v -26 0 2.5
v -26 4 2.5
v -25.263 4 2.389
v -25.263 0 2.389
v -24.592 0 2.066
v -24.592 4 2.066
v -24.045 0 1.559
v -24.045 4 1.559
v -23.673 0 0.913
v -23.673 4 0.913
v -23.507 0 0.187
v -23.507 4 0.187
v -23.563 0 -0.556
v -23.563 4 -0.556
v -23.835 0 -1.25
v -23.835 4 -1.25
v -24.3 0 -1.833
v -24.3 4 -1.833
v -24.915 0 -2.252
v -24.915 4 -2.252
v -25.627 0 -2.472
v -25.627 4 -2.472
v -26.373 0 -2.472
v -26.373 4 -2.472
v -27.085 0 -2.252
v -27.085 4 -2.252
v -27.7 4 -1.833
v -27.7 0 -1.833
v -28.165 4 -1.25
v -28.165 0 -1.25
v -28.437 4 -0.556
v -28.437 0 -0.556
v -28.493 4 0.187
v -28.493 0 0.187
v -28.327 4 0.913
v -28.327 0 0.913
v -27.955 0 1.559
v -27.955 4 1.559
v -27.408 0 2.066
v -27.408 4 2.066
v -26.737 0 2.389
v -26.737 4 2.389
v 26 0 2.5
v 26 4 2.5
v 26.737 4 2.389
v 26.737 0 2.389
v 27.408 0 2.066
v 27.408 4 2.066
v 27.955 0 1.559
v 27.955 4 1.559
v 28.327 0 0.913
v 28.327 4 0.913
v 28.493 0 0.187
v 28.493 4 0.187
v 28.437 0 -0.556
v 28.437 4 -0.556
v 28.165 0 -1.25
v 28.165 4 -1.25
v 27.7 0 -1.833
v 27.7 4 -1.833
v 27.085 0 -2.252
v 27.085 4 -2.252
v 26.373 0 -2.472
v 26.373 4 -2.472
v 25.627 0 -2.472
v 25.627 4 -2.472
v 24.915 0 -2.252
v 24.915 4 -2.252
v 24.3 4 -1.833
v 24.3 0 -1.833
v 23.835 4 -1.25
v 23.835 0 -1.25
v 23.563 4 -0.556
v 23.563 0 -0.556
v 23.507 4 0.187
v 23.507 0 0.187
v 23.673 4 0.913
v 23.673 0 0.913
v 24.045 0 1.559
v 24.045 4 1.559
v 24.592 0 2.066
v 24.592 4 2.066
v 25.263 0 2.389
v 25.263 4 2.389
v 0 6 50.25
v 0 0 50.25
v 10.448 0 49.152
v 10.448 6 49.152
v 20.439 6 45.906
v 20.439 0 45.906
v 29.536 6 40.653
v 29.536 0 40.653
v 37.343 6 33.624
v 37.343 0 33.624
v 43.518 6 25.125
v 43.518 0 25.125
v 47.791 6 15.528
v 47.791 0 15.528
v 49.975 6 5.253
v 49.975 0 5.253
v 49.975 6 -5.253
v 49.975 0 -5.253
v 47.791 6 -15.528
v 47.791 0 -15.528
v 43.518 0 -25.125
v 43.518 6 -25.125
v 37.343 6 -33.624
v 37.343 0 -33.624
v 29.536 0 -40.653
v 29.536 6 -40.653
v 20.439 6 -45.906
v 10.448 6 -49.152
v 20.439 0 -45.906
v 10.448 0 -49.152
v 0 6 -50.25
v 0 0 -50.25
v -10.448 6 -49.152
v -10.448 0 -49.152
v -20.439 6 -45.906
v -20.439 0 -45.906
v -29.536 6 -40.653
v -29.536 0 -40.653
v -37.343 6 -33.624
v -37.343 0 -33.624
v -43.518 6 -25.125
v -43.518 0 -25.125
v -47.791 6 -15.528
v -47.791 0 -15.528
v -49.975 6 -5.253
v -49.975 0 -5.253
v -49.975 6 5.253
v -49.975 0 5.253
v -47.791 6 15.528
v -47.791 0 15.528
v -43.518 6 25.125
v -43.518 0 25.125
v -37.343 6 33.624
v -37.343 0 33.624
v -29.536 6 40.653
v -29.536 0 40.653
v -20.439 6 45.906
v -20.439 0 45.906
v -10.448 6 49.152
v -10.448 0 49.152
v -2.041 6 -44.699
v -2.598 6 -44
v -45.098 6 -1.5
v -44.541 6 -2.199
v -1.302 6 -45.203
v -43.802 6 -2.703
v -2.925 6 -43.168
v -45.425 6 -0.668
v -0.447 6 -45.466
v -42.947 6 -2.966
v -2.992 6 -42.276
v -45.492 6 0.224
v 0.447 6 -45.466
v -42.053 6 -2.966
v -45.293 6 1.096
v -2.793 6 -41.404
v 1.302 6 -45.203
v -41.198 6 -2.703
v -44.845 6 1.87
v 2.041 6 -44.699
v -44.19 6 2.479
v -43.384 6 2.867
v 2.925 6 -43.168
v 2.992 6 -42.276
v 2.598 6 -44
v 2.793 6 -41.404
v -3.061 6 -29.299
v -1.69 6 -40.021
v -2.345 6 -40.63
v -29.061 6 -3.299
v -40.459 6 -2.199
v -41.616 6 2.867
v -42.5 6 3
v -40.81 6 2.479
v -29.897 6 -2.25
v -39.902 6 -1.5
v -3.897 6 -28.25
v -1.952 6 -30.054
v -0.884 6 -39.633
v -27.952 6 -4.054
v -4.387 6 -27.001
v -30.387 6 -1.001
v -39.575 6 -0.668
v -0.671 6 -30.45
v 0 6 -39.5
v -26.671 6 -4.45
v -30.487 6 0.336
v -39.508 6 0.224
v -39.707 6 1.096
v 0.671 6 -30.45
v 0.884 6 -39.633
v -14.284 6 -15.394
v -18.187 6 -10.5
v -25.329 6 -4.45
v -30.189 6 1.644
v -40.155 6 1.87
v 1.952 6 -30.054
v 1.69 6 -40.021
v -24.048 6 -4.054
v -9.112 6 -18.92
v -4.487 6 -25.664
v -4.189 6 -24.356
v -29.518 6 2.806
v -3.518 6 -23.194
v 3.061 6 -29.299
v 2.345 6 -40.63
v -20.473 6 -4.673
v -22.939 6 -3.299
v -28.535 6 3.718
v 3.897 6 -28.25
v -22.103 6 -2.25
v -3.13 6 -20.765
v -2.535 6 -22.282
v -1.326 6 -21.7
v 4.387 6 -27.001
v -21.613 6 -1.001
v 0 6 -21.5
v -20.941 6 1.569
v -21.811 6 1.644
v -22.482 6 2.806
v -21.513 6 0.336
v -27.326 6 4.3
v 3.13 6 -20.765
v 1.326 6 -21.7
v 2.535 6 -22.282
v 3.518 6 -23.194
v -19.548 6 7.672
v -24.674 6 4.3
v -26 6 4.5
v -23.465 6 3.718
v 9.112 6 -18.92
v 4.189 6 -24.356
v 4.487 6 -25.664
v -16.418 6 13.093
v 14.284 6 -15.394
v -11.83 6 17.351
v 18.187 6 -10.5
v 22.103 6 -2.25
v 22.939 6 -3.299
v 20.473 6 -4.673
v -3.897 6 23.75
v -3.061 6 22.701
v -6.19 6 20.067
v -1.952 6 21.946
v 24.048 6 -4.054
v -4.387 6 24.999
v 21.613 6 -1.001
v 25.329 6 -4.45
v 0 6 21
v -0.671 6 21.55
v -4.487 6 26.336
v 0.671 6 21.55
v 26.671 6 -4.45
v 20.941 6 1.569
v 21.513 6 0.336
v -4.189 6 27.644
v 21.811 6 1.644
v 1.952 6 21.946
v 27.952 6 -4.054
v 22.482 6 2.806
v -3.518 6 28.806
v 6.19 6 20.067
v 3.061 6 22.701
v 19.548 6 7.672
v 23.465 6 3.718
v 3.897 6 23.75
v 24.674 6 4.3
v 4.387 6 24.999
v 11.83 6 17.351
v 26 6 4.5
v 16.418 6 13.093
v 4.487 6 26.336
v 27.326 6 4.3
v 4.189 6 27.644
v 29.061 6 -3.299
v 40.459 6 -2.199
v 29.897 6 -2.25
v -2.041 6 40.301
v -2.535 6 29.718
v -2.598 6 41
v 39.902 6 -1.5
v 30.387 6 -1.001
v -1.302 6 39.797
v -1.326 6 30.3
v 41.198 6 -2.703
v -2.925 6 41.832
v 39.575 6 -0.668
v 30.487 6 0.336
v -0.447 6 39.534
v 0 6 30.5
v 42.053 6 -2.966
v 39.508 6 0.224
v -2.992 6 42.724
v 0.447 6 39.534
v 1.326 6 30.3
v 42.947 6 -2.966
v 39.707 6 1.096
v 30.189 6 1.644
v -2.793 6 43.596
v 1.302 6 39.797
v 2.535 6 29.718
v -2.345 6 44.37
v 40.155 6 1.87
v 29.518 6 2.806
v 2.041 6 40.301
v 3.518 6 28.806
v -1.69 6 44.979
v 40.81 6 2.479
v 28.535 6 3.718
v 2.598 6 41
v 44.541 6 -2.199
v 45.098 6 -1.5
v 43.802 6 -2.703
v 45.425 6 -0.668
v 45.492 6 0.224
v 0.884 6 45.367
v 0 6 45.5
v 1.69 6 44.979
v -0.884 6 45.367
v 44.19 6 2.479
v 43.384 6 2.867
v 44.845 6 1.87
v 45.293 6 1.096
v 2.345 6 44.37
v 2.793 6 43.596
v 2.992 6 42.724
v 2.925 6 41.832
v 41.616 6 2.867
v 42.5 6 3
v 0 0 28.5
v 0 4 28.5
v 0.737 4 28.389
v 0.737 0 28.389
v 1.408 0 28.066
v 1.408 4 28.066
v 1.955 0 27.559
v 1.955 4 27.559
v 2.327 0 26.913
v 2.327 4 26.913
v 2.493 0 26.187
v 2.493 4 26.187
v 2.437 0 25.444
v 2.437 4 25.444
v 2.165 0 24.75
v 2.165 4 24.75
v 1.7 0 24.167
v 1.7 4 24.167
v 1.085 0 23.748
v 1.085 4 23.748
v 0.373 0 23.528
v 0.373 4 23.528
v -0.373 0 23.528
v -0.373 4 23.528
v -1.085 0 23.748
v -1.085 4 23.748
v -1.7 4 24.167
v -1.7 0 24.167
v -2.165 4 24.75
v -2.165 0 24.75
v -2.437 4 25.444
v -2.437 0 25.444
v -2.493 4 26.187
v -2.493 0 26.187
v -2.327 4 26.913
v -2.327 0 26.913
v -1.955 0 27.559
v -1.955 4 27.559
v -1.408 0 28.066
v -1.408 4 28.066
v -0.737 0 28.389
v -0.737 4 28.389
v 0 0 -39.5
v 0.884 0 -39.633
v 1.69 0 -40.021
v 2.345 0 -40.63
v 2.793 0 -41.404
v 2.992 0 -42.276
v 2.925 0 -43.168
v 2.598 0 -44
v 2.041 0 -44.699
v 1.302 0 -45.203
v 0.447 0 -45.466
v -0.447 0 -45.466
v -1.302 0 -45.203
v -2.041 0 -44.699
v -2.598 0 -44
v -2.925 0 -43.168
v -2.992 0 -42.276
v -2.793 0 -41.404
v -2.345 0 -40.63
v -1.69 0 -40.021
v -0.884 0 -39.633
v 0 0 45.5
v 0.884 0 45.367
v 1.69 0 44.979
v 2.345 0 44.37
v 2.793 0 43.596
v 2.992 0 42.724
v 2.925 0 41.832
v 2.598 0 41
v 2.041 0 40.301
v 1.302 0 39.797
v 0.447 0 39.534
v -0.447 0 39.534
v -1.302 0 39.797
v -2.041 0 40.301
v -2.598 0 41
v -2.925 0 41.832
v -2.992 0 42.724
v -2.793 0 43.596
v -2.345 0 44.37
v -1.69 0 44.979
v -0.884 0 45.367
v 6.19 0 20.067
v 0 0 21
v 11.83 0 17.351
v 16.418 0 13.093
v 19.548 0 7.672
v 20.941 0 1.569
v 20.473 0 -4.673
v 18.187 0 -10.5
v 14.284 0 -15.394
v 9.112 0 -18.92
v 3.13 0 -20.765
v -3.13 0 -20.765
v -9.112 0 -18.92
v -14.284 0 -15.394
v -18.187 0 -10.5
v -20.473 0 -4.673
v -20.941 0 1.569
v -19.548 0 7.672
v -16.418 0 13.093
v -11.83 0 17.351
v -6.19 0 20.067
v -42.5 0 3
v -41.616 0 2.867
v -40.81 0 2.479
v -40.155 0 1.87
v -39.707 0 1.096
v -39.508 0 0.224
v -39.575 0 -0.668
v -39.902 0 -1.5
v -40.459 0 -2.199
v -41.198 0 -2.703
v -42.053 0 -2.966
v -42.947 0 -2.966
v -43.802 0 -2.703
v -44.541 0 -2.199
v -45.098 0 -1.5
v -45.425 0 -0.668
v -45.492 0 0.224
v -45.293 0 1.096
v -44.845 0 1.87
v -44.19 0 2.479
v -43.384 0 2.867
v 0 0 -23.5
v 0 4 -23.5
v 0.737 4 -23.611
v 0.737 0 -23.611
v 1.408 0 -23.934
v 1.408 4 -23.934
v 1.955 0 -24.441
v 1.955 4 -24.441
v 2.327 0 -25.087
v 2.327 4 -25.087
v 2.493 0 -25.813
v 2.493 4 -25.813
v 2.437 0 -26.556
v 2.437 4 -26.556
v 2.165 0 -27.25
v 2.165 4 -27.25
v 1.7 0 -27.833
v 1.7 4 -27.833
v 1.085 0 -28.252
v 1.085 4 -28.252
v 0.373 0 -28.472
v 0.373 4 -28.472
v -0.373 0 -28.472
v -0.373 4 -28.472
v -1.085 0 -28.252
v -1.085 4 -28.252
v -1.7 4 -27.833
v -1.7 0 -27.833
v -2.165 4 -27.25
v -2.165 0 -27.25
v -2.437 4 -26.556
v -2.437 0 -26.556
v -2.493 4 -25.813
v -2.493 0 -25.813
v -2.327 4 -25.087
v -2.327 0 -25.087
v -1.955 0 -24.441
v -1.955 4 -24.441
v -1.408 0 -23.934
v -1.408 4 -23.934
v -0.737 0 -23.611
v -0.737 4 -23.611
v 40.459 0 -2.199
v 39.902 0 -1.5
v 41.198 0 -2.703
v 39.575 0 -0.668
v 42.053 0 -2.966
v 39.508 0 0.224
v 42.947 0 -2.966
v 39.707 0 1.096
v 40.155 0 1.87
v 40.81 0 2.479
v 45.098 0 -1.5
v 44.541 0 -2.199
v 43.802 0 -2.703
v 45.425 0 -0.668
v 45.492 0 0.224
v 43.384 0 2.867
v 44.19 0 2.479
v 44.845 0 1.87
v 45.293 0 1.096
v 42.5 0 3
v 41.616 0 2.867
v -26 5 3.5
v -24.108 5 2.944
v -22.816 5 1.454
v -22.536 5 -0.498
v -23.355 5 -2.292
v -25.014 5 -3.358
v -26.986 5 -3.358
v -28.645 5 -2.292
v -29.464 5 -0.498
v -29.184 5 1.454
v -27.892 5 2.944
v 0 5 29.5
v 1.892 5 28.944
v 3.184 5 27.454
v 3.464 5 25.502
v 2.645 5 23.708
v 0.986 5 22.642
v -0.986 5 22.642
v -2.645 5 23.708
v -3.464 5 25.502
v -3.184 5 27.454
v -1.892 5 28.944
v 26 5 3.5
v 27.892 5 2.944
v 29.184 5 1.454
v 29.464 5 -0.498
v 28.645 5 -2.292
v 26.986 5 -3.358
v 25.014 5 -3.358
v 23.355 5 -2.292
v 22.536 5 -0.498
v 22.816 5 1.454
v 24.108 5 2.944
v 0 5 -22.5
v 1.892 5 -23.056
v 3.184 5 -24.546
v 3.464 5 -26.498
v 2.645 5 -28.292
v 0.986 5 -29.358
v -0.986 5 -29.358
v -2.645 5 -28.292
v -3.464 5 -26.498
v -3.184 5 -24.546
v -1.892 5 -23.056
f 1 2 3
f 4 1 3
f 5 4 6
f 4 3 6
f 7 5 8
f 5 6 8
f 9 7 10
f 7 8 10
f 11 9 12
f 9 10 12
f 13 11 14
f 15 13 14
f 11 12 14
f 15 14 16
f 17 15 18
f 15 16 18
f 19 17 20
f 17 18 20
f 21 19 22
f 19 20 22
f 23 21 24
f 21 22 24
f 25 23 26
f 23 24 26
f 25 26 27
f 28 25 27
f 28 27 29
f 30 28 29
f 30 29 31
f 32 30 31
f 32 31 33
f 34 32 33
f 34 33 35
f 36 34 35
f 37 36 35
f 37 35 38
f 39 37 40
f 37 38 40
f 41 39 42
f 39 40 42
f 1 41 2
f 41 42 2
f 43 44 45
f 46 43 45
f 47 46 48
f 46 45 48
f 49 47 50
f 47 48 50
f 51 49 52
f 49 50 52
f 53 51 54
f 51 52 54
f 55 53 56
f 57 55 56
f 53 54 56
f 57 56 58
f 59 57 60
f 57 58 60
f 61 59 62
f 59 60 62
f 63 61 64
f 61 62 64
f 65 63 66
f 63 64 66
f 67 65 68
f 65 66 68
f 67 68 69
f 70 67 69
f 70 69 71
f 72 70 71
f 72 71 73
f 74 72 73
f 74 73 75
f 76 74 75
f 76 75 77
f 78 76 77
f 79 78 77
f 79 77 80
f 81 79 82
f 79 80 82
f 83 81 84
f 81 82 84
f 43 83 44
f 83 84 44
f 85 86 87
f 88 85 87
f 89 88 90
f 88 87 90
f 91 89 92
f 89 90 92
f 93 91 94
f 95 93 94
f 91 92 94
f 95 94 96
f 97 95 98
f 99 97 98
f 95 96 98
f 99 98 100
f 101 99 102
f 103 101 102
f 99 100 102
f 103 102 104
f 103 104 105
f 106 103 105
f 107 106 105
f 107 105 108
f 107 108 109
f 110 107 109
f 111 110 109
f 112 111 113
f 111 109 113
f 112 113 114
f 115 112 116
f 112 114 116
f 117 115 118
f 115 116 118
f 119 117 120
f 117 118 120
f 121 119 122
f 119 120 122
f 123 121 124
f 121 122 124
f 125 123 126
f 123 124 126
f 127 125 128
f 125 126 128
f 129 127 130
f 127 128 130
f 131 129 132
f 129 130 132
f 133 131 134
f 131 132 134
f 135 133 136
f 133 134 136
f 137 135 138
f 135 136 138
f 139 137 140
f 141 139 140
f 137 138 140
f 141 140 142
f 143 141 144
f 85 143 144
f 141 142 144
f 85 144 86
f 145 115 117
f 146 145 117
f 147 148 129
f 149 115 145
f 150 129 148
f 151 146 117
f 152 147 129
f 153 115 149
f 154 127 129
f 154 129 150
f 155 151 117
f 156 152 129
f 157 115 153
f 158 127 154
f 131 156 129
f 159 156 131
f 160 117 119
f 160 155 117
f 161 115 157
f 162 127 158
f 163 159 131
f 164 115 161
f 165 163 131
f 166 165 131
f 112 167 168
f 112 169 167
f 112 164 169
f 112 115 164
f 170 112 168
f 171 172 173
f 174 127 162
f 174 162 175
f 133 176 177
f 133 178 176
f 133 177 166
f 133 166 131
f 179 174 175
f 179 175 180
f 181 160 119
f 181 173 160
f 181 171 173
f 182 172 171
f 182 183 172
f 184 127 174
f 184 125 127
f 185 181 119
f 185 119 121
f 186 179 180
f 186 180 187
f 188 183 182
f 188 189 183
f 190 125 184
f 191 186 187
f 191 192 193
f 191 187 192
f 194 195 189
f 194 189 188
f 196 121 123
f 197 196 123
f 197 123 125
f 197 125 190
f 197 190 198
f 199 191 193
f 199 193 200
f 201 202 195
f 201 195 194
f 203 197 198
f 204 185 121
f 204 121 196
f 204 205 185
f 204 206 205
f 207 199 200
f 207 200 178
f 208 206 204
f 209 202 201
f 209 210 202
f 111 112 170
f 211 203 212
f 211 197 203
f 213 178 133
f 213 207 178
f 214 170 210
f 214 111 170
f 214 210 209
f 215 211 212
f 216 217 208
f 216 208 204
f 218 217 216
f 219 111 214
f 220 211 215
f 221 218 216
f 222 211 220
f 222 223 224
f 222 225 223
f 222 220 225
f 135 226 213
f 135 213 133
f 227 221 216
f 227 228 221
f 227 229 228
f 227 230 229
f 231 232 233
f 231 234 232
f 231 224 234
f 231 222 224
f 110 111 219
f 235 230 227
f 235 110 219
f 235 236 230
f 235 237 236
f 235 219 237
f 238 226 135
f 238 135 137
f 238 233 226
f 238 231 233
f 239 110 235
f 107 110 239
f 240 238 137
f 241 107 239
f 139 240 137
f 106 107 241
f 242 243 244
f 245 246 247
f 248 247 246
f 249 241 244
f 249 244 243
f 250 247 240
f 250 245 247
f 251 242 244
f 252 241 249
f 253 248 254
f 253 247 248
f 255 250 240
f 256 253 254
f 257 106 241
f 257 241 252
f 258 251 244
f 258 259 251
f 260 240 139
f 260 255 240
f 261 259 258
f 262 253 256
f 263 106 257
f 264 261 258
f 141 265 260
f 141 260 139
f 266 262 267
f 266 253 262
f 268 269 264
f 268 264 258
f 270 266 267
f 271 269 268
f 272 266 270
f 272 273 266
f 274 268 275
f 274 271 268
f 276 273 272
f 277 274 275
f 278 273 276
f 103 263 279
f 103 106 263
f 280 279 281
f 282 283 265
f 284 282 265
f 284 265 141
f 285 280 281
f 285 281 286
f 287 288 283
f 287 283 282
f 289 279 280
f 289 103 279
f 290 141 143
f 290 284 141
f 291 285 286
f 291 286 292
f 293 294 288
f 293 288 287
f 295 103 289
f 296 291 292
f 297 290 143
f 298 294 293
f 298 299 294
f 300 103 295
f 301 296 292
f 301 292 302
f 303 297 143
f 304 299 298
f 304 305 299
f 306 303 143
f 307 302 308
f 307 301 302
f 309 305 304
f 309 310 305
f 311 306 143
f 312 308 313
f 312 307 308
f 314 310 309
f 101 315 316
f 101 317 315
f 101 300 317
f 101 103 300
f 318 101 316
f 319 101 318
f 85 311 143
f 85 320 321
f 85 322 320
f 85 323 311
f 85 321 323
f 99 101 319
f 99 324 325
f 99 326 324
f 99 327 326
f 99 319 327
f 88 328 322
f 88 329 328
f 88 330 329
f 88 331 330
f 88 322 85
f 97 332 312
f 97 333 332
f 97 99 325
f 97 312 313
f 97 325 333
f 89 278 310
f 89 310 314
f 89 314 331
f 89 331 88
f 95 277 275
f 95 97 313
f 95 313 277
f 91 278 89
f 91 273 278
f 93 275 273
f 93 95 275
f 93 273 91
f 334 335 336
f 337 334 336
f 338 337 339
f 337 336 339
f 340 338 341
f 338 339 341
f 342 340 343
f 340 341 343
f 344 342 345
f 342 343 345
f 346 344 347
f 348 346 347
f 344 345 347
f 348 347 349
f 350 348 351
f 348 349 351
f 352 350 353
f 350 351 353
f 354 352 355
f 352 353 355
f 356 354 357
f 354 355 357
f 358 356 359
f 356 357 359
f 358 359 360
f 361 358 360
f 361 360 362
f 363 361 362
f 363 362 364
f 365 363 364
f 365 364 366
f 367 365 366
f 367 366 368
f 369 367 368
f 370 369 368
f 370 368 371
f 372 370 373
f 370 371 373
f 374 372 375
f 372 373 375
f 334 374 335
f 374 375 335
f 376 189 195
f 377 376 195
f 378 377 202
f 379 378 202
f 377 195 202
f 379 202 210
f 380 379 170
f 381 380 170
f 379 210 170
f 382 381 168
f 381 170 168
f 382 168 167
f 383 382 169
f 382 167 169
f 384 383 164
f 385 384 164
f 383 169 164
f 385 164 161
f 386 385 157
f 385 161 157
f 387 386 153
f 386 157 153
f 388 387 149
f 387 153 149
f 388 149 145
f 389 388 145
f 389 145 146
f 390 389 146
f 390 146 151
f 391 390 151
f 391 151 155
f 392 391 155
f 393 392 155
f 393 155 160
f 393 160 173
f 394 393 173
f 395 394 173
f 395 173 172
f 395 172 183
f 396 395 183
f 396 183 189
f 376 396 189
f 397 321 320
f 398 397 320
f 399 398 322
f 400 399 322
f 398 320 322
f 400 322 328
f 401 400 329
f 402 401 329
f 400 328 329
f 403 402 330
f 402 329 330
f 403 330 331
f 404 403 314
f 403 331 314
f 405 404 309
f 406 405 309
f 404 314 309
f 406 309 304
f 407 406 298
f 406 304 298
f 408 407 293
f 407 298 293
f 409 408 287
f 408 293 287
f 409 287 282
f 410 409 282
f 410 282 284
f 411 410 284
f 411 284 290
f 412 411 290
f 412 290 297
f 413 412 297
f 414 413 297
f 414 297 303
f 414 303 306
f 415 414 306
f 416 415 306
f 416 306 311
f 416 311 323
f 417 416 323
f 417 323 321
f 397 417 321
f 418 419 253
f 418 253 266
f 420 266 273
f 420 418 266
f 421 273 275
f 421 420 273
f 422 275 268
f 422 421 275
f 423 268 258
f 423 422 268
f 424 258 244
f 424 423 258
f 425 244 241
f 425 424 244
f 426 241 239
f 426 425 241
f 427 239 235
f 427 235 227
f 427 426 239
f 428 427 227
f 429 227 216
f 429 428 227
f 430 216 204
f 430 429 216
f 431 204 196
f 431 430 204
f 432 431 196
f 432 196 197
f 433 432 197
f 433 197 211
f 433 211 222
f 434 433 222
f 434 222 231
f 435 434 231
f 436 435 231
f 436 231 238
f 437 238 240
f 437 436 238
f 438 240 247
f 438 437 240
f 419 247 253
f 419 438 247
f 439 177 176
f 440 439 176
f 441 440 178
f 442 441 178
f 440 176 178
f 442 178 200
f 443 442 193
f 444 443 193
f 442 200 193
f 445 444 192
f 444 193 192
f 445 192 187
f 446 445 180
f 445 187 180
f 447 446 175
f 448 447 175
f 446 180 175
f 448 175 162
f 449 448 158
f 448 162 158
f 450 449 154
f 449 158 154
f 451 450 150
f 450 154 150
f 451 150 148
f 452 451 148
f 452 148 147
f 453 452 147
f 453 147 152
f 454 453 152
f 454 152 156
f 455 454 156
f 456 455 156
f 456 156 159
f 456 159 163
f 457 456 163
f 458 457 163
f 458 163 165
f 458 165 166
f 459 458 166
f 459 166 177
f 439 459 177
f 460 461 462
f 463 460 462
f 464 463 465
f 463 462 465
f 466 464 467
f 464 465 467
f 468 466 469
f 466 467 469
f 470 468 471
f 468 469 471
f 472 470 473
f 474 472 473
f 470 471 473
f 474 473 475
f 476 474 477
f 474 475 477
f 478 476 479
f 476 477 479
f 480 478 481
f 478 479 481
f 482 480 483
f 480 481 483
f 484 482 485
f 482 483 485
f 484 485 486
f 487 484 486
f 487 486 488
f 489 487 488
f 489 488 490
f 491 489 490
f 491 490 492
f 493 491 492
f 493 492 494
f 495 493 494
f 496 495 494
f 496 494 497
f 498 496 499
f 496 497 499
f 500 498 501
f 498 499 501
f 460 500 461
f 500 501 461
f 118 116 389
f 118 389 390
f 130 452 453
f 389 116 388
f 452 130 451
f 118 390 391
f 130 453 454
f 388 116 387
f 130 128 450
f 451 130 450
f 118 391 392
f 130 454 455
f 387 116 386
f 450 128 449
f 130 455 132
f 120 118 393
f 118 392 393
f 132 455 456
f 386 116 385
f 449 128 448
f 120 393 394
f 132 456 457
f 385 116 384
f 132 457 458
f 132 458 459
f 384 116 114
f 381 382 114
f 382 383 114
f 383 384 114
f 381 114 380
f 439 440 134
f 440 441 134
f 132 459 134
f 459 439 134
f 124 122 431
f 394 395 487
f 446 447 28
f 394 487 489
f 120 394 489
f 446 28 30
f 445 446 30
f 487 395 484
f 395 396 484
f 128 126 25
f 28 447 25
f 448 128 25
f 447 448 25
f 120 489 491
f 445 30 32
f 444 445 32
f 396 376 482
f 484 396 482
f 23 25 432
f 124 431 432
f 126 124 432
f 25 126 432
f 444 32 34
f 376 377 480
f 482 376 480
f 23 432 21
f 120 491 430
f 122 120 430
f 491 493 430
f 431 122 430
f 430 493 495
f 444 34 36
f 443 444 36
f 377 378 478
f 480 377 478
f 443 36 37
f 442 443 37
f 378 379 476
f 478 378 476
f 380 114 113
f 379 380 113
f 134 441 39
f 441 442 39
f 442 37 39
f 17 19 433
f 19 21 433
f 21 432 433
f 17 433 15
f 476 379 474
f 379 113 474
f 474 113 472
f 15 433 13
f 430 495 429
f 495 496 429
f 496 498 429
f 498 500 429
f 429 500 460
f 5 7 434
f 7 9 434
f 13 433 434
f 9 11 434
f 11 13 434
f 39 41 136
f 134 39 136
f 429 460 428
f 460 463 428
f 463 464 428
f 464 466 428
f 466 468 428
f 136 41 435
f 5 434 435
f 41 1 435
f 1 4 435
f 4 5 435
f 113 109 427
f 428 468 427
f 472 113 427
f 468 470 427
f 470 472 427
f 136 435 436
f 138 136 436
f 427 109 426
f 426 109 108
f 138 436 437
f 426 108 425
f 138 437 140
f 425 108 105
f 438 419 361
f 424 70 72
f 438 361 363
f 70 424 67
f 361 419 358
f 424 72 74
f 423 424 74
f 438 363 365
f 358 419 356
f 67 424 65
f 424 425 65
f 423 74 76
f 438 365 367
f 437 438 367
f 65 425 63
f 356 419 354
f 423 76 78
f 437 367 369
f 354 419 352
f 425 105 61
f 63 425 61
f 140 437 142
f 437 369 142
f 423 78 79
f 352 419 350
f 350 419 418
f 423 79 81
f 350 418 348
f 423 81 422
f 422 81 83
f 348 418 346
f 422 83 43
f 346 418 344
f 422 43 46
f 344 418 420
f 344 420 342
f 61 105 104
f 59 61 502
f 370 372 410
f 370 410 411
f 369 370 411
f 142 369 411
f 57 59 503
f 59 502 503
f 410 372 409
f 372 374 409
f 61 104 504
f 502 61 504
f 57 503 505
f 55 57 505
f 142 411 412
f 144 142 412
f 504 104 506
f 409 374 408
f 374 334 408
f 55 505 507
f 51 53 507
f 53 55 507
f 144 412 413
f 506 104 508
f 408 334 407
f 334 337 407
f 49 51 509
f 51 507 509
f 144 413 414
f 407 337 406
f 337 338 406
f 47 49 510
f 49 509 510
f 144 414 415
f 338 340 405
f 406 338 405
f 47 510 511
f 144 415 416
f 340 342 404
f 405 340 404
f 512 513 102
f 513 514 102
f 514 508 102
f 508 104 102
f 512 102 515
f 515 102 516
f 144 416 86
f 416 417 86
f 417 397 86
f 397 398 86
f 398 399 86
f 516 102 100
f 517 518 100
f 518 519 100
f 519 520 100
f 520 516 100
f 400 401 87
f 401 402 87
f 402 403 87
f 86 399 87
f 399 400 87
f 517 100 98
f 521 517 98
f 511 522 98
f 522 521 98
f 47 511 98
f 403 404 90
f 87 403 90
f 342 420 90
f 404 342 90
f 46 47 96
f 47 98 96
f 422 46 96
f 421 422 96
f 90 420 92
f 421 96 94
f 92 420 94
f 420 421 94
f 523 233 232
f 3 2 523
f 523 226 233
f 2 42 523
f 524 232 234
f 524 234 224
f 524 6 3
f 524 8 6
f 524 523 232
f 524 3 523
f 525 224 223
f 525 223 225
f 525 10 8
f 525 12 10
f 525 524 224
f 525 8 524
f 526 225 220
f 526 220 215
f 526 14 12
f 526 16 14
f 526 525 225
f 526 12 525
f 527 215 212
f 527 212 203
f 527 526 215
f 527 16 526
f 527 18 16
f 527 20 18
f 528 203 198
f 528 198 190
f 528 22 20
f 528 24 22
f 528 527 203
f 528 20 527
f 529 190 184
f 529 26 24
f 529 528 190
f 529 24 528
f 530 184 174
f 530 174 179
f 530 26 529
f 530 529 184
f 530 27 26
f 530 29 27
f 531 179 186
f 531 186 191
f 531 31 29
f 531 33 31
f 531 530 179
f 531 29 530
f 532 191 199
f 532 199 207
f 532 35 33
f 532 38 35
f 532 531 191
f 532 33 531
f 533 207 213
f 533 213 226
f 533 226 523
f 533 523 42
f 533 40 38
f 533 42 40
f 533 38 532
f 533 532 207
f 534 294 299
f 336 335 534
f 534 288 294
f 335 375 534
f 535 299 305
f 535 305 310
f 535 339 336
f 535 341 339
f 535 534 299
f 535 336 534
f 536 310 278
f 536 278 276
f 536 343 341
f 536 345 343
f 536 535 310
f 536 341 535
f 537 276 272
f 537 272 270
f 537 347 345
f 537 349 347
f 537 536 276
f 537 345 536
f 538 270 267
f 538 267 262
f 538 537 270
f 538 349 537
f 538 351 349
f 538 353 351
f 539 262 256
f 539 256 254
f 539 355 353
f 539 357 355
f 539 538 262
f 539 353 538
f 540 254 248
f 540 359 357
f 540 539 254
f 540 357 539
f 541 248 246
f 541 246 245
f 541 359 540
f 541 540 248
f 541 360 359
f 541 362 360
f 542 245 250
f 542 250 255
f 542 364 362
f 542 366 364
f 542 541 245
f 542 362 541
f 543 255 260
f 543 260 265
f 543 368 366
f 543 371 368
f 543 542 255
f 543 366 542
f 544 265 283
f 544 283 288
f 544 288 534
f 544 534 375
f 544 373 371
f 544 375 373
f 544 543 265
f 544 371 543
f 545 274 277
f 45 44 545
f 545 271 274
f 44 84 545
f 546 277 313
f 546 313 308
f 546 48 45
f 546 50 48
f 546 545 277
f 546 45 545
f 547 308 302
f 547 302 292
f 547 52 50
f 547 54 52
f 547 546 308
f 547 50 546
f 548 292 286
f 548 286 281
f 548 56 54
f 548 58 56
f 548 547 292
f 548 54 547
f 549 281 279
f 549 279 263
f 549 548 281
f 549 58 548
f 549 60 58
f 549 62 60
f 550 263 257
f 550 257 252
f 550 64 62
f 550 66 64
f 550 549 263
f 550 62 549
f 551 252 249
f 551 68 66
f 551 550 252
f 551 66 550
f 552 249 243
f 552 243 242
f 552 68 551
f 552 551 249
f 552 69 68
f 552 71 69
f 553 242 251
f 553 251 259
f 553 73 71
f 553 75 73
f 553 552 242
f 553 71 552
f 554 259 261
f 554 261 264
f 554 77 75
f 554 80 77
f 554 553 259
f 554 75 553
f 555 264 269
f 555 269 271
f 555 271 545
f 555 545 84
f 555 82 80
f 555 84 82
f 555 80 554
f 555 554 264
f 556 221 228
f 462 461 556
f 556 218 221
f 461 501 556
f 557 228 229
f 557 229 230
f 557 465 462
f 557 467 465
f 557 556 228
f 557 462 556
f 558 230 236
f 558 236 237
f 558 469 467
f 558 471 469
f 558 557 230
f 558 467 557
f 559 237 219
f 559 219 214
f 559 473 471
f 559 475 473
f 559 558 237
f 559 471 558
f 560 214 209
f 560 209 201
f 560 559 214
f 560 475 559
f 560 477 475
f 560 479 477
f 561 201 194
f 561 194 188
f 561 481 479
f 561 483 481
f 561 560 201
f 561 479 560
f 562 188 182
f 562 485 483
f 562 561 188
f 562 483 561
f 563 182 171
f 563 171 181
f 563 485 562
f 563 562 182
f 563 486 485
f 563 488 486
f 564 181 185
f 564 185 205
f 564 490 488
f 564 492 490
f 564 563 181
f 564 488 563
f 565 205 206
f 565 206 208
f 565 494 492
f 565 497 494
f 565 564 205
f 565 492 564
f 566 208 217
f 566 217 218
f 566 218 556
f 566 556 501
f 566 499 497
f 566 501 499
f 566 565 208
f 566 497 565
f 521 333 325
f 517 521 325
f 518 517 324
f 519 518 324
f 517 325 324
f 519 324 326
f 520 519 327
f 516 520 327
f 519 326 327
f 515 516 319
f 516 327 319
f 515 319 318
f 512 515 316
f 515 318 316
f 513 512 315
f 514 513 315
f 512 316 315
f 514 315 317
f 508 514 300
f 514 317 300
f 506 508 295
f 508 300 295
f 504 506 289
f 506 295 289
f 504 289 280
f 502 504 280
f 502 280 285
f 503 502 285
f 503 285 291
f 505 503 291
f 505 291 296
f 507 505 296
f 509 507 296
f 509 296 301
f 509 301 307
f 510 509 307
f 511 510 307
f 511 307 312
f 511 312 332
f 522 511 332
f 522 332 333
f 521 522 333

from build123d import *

# Parameters (mm, degrees)
SKETCH_1_R          = 50.25
SKETCH_1_R_2        = 21
EXTRUDE_1_DEPTH     = 6
SKETCH_2_R          = 2.5
CUT_EXTRUDE_1_DEPTH = 6
SKETCH_3_R          = 3
CUT_EXTRUDE_2_DEPTH = 10
CHAMFER_1_SIZE      = 2


with BuildPart() as part:
    # Эскиз1 → Бобышка-Вытянуть1 (new body)
    with BuildSketch(Plane(origin=(0, 0, 0), x_dir=(1, 0, 0), z_dir=(0, 1, 0))):
        with Locations(Location((0, 0, 0), (0, 0, 270))):
            Circle(SKETCH_1_R)
        with Locations(Location((0, 0, 0), (0, 0, 270))):
            Circle(SKETCH_1_R_2, mode=Mode.SUBTRACT)
    extrude(amount=EXTRUDE_1_DEPTH)

    # Эскиз2 → Вырез-Вытянуть1 (cut)
    with BuildSketch(Plane(origin=(0, 6, 0), x_dir=(1, 0, 0), z_dir=(0, 1, 0))):
        with Locations(Location((0, 26, 0), (0, 0, 270))):
            Circle(SKETCH_2_R)
        with Locations(Location((-26, 0, 0), (0, 0, 270))):
            Circle(SKETCH_2_R)
        with Locations(Location((26, 0, 0), (0, 0, 270))):
            Circle(SKETCH_2_R)
        with Locations(Location((0, -26, 0), (0, 0, 270))):
            Circle(SKETCH_2_R)
    extrude(amount=-CUT_EXTRUDE_1_DEPTH, mode=Mode.SUBTRACT)

    # Эскиз3 → Вырез-Вытянуть2 (cut)
    with BuildSketch(Plane(origin=(0, 6, 0), x_dir=(1, 0, 0), z_dir=(0, 1, 0))):
        with Locations(Location((-42.5, 0, 0), (0, 0, 270))):
            Circle(SKETCH_3_R)
        with Locations(Location((0, 42.5, 0), (0, 0, 270))):
            Circle(SKETCH_3_R)
        with Locations(Location((42.5, 0, 0), (0, 0, 270))):
            Circle(SKETCH_3_R)
        with Locations(Location((0, -42.5, 0), (0, 0, 270))):
            Circle(SKETCH_3_R)
    extrude(amount=-CUT_EXTRUDE_2_DEPTH, mode=Mode.SUBTRACT)

    # Фаска1
    chamfer_1_edges = [part.edges().sort_by_distance(p)[0] for p in [
        (0, 6, -28.5),
        (-26, 6, -2.5),
        (26, 6, -2.5),
        (0, 6, 23.5),
    ]]
    chamfer(chamfer_1_edges, length=CHAMFER_1_SIZE)


solid = part.part
